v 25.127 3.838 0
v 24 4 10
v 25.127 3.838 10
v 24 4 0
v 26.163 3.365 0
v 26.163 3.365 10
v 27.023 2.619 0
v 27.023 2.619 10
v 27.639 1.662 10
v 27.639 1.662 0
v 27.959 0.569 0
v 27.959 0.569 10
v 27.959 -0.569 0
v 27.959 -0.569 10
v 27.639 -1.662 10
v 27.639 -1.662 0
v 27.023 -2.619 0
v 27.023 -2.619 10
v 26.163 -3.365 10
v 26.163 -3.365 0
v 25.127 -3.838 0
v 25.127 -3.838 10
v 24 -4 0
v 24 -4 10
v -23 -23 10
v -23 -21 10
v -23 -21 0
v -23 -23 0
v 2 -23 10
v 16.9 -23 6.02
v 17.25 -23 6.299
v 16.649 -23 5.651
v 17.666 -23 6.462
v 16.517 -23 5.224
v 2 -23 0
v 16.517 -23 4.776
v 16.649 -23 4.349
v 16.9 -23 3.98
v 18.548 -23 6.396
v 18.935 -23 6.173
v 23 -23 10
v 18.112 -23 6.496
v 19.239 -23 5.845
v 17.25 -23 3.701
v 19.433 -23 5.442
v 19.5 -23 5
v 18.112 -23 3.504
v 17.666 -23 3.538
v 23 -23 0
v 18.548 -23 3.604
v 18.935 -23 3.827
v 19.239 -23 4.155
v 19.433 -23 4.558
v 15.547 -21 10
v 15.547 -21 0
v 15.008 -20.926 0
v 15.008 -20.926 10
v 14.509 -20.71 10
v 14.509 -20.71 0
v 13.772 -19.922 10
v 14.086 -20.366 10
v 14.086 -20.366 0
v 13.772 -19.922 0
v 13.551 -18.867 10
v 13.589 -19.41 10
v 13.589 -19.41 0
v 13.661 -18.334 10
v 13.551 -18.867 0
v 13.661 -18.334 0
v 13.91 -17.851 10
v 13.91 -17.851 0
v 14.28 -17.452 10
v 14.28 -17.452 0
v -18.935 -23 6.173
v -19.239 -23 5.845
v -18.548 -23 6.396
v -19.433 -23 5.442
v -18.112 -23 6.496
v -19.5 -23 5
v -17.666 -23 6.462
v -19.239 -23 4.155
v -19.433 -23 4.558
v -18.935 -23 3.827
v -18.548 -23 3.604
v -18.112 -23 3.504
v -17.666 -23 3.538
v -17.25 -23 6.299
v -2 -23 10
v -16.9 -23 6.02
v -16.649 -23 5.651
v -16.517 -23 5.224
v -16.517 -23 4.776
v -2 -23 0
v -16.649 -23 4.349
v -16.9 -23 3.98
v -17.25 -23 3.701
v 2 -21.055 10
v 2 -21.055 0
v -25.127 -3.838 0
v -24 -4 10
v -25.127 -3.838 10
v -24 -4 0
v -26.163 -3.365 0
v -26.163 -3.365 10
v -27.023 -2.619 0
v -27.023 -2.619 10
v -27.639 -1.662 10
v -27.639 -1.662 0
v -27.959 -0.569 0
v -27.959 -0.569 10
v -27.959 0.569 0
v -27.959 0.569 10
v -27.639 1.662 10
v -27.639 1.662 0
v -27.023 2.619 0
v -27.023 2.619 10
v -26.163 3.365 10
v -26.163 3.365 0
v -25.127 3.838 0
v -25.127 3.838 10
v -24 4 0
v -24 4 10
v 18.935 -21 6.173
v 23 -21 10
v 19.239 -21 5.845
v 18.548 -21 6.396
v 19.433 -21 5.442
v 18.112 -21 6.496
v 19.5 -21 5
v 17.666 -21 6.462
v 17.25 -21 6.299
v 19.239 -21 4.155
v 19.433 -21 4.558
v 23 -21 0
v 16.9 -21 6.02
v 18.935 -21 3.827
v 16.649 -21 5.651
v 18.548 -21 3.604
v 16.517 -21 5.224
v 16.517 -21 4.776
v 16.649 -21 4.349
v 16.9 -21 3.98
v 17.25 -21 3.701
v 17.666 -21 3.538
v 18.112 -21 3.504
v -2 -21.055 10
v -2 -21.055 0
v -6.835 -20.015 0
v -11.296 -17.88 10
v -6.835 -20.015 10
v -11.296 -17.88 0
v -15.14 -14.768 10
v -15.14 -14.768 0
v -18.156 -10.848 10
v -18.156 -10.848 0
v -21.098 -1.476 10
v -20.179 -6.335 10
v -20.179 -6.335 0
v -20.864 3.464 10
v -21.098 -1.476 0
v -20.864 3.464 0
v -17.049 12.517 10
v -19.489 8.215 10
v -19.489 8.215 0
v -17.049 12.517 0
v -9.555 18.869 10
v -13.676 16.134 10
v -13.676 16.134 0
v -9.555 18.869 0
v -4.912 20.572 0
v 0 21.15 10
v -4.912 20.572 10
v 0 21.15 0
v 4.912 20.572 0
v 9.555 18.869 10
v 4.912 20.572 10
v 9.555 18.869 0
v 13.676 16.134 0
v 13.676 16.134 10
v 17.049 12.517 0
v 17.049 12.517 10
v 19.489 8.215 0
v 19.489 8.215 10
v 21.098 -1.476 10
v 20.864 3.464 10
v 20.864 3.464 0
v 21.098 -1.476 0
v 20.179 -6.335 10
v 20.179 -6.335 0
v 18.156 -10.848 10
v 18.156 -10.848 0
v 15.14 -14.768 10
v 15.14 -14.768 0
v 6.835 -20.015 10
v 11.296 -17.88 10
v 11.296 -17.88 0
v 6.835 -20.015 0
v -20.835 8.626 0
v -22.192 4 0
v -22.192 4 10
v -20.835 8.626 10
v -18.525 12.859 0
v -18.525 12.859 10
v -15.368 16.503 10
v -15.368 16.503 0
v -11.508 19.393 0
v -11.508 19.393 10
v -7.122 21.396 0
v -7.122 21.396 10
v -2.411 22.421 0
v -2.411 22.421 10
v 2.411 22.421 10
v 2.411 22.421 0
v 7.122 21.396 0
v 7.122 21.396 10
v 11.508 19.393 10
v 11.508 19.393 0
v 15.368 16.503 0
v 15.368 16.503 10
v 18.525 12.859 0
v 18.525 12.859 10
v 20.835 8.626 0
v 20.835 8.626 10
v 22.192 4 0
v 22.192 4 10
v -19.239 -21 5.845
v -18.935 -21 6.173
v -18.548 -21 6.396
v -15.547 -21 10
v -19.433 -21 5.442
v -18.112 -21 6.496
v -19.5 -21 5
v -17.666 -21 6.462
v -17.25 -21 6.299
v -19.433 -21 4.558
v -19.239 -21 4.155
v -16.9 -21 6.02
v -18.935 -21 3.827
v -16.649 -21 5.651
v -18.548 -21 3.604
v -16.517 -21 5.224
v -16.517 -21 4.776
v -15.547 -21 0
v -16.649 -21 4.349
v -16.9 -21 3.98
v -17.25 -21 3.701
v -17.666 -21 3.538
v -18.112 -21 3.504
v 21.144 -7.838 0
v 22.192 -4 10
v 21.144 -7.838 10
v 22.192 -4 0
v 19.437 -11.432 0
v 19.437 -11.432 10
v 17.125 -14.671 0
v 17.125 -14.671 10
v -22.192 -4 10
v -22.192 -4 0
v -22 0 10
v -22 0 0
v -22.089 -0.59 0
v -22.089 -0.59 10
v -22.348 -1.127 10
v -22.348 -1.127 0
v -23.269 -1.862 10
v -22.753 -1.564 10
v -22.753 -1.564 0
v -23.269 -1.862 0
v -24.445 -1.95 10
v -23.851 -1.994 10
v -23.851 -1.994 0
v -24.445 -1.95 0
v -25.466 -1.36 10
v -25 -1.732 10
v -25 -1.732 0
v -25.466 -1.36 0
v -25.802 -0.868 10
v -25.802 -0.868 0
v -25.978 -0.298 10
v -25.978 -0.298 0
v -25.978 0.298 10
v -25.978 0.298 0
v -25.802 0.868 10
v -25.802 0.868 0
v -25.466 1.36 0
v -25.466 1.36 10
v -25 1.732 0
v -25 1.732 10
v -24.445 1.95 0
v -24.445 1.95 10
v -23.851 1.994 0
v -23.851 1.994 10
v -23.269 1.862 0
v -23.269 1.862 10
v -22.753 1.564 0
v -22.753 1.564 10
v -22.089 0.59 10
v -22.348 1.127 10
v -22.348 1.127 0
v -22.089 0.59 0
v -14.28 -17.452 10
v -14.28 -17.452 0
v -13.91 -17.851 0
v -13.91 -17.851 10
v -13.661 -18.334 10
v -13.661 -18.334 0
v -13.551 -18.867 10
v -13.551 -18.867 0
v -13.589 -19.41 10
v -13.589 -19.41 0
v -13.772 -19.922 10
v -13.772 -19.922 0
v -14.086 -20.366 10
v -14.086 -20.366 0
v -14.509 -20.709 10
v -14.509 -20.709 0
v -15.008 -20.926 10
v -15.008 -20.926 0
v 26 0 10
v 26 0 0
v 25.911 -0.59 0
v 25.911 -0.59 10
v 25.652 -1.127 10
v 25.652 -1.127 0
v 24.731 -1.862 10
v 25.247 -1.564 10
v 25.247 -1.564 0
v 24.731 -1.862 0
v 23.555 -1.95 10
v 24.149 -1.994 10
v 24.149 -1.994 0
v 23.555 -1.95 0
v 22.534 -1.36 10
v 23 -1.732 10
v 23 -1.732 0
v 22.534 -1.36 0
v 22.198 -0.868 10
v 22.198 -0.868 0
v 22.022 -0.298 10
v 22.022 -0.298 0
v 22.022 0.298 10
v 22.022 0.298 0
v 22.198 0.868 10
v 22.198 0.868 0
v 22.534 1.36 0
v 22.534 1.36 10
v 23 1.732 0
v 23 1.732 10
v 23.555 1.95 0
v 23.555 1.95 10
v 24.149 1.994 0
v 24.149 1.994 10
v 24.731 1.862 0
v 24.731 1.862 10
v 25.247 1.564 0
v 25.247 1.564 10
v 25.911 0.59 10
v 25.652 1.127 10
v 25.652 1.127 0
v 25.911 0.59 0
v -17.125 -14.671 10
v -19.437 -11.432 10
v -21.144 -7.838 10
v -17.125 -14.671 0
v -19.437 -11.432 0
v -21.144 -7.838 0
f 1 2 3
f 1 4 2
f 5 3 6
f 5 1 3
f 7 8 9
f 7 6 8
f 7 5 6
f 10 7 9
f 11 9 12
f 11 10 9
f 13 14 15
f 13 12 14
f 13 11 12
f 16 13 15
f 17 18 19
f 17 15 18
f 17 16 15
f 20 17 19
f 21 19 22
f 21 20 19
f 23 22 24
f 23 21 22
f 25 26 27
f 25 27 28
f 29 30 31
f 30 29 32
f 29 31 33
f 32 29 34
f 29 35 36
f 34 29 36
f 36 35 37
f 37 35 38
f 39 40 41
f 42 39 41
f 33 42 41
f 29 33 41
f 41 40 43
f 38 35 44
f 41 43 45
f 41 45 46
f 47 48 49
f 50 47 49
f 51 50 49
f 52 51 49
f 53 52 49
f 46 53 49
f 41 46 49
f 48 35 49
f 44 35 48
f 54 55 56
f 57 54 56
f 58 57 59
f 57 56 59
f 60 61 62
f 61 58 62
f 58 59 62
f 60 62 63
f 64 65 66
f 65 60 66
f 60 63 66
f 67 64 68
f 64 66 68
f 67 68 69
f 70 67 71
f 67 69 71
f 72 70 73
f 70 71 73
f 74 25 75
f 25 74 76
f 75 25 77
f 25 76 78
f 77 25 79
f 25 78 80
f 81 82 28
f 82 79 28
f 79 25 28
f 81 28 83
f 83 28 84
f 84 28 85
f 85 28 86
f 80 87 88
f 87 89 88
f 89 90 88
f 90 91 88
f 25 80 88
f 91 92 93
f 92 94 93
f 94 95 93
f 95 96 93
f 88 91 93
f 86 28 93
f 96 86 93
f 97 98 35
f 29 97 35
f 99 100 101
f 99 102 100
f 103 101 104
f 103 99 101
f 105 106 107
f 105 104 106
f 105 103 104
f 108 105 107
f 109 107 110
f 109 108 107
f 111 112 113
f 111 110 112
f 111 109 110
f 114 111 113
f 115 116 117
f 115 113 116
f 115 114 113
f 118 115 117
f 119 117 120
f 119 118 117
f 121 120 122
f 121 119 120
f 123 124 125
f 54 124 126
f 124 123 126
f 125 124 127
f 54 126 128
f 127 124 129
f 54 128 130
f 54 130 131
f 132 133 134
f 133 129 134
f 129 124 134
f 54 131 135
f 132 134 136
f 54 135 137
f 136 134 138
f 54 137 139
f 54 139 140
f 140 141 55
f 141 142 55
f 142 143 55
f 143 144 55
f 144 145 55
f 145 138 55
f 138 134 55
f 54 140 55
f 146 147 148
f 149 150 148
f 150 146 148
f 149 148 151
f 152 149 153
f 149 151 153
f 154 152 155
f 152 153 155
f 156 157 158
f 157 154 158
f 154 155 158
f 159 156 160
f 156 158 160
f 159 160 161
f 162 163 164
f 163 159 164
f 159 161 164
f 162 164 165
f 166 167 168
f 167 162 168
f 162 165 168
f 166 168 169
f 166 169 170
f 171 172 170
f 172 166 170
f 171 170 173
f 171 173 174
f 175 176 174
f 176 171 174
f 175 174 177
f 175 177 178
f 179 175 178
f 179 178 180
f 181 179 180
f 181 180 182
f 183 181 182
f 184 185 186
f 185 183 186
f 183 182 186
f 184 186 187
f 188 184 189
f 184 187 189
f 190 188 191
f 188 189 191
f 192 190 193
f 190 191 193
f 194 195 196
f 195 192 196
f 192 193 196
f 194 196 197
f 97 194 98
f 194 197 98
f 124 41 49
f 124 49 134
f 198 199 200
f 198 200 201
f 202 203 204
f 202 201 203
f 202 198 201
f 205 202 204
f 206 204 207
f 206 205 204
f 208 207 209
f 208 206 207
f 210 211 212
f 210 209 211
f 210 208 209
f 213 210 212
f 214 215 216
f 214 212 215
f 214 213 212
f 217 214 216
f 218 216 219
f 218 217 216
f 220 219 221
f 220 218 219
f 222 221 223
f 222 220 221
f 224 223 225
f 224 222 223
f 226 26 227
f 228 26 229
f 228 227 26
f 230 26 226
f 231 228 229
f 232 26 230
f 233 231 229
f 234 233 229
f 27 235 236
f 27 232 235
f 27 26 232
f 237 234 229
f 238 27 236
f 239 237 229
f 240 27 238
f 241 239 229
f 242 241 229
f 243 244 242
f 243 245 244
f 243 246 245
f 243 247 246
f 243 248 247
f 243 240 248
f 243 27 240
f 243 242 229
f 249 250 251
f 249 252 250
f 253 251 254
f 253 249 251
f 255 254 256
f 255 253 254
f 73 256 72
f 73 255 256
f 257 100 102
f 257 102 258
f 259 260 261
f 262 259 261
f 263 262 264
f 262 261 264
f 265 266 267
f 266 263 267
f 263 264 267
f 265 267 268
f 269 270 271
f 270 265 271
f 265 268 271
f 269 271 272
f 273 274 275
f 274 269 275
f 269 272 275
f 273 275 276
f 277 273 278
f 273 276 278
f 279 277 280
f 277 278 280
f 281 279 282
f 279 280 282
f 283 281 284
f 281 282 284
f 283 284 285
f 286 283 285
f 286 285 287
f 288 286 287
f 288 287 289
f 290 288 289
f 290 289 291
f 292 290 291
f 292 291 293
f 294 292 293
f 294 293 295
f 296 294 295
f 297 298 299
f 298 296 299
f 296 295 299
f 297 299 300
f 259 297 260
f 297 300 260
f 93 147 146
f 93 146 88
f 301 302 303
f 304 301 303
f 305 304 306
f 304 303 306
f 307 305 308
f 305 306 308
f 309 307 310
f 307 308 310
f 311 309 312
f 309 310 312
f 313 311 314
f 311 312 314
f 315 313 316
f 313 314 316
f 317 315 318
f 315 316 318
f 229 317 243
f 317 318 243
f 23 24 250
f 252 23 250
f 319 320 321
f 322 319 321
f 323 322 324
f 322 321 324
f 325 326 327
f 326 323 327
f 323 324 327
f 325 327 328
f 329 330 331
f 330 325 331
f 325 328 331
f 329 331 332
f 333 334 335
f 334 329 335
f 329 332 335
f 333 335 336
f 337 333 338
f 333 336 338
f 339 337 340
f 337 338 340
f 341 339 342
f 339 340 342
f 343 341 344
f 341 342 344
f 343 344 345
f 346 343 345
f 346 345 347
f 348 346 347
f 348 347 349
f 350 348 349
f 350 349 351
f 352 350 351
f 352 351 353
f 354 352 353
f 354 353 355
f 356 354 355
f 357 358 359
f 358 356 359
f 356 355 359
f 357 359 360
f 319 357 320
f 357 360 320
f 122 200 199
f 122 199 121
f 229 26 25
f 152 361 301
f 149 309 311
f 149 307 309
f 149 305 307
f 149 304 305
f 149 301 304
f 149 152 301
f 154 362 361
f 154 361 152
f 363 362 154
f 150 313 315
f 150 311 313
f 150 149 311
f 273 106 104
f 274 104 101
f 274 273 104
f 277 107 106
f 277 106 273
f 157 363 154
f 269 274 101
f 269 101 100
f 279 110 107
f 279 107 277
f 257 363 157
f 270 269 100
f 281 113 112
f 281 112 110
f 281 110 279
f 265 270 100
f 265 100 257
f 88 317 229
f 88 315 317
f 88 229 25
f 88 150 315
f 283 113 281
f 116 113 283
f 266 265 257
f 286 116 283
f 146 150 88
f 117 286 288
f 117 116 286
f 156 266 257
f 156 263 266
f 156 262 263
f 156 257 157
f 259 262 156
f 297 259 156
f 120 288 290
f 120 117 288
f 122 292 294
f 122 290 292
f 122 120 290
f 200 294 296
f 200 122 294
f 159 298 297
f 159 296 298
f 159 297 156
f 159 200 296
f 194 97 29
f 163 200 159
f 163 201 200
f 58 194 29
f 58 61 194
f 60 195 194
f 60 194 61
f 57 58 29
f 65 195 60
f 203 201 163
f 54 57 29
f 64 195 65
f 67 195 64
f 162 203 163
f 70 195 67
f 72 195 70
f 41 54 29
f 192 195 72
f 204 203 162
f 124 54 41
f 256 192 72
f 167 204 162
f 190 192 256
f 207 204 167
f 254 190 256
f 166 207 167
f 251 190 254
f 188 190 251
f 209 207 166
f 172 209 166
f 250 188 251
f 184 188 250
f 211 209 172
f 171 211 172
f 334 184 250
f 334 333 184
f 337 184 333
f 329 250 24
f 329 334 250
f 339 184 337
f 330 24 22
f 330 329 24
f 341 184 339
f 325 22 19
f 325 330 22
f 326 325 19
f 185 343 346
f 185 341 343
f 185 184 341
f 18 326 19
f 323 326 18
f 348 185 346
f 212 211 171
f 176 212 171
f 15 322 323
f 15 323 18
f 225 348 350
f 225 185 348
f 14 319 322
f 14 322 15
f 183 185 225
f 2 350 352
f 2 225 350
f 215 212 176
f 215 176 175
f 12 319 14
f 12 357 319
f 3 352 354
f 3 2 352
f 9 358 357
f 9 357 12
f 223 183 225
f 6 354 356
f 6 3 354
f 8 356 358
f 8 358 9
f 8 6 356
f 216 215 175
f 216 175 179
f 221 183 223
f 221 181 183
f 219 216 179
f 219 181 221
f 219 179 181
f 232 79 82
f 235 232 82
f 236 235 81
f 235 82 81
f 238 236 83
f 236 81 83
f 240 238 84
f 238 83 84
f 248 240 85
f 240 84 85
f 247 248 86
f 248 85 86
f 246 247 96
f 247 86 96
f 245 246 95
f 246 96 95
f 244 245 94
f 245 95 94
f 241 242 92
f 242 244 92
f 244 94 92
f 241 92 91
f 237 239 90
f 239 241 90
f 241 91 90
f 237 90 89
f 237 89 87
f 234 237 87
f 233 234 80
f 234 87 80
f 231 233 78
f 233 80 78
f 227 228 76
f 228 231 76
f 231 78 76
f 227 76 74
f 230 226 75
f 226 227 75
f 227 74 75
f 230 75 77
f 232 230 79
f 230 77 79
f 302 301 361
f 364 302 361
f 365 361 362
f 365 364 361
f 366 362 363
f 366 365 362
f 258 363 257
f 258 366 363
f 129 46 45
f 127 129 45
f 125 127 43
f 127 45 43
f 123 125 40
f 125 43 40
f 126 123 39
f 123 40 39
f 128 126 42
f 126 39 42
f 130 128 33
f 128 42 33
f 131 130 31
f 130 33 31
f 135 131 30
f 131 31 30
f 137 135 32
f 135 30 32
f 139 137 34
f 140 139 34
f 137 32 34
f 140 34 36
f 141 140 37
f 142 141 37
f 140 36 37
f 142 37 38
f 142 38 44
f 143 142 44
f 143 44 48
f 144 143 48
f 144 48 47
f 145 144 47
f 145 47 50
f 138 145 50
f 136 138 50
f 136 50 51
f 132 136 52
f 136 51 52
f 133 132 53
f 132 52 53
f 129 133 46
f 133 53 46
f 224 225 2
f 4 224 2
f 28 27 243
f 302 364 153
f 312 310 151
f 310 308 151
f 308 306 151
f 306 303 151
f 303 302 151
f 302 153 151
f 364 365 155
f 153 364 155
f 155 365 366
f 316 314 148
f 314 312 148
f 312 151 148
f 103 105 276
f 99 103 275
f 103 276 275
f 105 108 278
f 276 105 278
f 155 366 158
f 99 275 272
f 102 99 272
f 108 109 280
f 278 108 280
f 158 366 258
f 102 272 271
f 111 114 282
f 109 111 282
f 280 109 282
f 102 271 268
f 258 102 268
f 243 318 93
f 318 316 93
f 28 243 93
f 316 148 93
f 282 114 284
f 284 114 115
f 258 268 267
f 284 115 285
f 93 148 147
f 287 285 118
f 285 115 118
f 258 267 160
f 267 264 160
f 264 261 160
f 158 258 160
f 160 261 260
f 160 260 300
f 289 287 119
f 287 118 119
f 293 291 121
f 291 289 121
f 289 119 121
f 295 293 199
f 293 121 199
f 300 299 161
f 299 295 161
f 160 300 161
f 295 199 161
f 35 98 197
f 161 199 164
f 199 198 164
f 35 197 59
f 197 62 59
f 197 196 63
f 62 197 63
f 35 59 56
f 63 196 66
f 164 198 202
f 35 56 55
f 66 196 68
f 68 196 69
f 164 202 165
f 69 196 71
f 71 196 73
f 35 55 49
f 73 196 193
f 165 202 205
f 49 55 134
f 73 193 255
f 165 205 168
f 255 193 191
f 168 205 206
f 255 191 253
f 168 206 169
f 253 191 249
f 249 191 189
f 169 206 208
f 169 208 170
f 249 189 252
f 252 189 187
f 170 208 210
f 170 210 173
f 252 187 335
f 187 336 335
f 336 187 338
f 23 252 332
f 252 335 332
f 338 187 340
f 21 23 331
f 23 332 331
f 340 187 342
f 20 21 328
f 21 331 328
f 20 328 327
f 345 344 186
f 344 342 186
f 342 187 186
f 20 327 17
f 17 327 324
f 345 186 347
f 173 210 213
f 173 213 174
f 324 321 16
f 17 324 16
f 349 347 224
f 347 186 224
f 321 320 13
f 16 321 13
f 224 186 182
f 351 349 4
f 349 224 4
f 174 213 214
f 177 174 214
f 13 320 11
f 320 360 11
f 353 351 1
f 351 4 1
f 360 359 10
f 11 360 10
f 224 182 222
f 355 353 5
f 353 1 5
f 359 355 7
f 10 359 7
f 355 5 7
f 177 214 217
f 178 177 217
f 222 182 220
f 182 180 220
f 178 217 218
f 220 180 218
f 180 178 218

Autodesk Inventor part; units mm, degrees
ref_plane "YZ Plane" through (0, 0, 0) normal (1, 0, 0) x (0, 1, 0)
ref_plane "XZ Plane" through (0, 0, 0) normal (0, 1, 0) x (-1, 0, 0)
ref_plane "XY Plane" through (0, 0, 0) normal (0, 0, 1) x (1, 0, 0)
sketch "Sketch1" plane through (0, 0, 0) normal (0, 0, 1) x (1, 0, 0)
  circle A0 centre (0, 0) radius 21.15 construction
  line L0 (-18, -23) -> (18, -23) construction
  line L1 (-18, -23) -> (-18, -38.1522) construction
  line L2 (18, -23) -> (18, -38.1522) construction
  line L3 (-23, -21) -> (-23, -23)
  line L4 (-23, -23) -> (-2, -23)
  line L5 (-2, -21.0552) -> (-2, -23)
  line L6 (2, -21.0552) -> (2, -23)
  line L7 (2, -23) -> (23, -23)
  line L8 (23, -23) -> (23, -21)
  line L9 (23, -21) -> (15.5468, -21)
  line L10 (-23, -21) -> (-15.5468, -21)
  arc A1 (2, -21.0552) -> (-2, -21.0552) centre (0, 0) ccw
  arc A2 (14.2802, -17.4521) -> (15.5468, -21) centre (15.5468, -19) ccw
  arc A3 (-15.5468, -21) -> (-14.2802, -17.4521) centre (-15.5468, -19) ccw
  circle A4 centre (-24, 0) radius 2
  circle A5 centre (24, 0) radius 2
  line L11 (-22.1924, 4) -> (-24, 4)
  arc A6 (-24, 4) -> (-24, -4) centre (-24, 0) ccw
  line L12 (-24, -4) -> (-22.1924, -4)
  line L13 (22.1924, 4) -> (24, 4)
  arc A7 (24, -4) -> (24, 4) centre (24, 0) ccw
  line L14 (24, -4) -> (22.1924, -4)
  arc A8 (-22.1924, -4) -> (-14.2802, -17.4521) centre (0, 0) ccw
  arc A9 (14.2802, -17.4521) -> (22.1924, -4) centre (0, 0) ccw
  arc A10 (22.1924, 4) -> (-22.1924, 4) centre (0, 0) ccw
  point P0 (0, -23)
  point P1 (8.216, -21)
  point P2 (-8.216, -21)
  dimension "d13" = 42.3
  dimension "d1" = 23
  dimension "d2" = 36
  dimension "d3" = 2
  dimension "d5" = 5
  dimension "d6" = 2
  dimension "d7" = 4
  dimension "d14" = 4
  dimension "d15" = 4
  dimension "d16" = 48
  dimension "d17" = 24
  dimension "d18" = 4
  dimension "d19" = 22.55
extrude "Extrusion1" add sketch "Sketch1" along normal blind 10
sketch "Sketch2" plane through (2, -23, 0) normal (0, -1, 0) x (1, 0, 0)
  circle A0 centre (16, 5) radius 1.5
  line L0 (21, 0) -> (21, 10) projected
  point P0 (-2, 0)
  point P1 (16, 0)
  point P2 (16, 0)
  point P3 (16, 0)
  point P4 (21, 5)
  dimension "d10" = 3
extrude "Extrusion2" cut sketch "Sketch2" against normal up to surface (2 mm away)
mirror "Mirror1" about plane through (0, 0, 0) normal (1, 0, 0) of "Extrusion2"
properties part number "OmegaRing" material "ABS Plastic"
